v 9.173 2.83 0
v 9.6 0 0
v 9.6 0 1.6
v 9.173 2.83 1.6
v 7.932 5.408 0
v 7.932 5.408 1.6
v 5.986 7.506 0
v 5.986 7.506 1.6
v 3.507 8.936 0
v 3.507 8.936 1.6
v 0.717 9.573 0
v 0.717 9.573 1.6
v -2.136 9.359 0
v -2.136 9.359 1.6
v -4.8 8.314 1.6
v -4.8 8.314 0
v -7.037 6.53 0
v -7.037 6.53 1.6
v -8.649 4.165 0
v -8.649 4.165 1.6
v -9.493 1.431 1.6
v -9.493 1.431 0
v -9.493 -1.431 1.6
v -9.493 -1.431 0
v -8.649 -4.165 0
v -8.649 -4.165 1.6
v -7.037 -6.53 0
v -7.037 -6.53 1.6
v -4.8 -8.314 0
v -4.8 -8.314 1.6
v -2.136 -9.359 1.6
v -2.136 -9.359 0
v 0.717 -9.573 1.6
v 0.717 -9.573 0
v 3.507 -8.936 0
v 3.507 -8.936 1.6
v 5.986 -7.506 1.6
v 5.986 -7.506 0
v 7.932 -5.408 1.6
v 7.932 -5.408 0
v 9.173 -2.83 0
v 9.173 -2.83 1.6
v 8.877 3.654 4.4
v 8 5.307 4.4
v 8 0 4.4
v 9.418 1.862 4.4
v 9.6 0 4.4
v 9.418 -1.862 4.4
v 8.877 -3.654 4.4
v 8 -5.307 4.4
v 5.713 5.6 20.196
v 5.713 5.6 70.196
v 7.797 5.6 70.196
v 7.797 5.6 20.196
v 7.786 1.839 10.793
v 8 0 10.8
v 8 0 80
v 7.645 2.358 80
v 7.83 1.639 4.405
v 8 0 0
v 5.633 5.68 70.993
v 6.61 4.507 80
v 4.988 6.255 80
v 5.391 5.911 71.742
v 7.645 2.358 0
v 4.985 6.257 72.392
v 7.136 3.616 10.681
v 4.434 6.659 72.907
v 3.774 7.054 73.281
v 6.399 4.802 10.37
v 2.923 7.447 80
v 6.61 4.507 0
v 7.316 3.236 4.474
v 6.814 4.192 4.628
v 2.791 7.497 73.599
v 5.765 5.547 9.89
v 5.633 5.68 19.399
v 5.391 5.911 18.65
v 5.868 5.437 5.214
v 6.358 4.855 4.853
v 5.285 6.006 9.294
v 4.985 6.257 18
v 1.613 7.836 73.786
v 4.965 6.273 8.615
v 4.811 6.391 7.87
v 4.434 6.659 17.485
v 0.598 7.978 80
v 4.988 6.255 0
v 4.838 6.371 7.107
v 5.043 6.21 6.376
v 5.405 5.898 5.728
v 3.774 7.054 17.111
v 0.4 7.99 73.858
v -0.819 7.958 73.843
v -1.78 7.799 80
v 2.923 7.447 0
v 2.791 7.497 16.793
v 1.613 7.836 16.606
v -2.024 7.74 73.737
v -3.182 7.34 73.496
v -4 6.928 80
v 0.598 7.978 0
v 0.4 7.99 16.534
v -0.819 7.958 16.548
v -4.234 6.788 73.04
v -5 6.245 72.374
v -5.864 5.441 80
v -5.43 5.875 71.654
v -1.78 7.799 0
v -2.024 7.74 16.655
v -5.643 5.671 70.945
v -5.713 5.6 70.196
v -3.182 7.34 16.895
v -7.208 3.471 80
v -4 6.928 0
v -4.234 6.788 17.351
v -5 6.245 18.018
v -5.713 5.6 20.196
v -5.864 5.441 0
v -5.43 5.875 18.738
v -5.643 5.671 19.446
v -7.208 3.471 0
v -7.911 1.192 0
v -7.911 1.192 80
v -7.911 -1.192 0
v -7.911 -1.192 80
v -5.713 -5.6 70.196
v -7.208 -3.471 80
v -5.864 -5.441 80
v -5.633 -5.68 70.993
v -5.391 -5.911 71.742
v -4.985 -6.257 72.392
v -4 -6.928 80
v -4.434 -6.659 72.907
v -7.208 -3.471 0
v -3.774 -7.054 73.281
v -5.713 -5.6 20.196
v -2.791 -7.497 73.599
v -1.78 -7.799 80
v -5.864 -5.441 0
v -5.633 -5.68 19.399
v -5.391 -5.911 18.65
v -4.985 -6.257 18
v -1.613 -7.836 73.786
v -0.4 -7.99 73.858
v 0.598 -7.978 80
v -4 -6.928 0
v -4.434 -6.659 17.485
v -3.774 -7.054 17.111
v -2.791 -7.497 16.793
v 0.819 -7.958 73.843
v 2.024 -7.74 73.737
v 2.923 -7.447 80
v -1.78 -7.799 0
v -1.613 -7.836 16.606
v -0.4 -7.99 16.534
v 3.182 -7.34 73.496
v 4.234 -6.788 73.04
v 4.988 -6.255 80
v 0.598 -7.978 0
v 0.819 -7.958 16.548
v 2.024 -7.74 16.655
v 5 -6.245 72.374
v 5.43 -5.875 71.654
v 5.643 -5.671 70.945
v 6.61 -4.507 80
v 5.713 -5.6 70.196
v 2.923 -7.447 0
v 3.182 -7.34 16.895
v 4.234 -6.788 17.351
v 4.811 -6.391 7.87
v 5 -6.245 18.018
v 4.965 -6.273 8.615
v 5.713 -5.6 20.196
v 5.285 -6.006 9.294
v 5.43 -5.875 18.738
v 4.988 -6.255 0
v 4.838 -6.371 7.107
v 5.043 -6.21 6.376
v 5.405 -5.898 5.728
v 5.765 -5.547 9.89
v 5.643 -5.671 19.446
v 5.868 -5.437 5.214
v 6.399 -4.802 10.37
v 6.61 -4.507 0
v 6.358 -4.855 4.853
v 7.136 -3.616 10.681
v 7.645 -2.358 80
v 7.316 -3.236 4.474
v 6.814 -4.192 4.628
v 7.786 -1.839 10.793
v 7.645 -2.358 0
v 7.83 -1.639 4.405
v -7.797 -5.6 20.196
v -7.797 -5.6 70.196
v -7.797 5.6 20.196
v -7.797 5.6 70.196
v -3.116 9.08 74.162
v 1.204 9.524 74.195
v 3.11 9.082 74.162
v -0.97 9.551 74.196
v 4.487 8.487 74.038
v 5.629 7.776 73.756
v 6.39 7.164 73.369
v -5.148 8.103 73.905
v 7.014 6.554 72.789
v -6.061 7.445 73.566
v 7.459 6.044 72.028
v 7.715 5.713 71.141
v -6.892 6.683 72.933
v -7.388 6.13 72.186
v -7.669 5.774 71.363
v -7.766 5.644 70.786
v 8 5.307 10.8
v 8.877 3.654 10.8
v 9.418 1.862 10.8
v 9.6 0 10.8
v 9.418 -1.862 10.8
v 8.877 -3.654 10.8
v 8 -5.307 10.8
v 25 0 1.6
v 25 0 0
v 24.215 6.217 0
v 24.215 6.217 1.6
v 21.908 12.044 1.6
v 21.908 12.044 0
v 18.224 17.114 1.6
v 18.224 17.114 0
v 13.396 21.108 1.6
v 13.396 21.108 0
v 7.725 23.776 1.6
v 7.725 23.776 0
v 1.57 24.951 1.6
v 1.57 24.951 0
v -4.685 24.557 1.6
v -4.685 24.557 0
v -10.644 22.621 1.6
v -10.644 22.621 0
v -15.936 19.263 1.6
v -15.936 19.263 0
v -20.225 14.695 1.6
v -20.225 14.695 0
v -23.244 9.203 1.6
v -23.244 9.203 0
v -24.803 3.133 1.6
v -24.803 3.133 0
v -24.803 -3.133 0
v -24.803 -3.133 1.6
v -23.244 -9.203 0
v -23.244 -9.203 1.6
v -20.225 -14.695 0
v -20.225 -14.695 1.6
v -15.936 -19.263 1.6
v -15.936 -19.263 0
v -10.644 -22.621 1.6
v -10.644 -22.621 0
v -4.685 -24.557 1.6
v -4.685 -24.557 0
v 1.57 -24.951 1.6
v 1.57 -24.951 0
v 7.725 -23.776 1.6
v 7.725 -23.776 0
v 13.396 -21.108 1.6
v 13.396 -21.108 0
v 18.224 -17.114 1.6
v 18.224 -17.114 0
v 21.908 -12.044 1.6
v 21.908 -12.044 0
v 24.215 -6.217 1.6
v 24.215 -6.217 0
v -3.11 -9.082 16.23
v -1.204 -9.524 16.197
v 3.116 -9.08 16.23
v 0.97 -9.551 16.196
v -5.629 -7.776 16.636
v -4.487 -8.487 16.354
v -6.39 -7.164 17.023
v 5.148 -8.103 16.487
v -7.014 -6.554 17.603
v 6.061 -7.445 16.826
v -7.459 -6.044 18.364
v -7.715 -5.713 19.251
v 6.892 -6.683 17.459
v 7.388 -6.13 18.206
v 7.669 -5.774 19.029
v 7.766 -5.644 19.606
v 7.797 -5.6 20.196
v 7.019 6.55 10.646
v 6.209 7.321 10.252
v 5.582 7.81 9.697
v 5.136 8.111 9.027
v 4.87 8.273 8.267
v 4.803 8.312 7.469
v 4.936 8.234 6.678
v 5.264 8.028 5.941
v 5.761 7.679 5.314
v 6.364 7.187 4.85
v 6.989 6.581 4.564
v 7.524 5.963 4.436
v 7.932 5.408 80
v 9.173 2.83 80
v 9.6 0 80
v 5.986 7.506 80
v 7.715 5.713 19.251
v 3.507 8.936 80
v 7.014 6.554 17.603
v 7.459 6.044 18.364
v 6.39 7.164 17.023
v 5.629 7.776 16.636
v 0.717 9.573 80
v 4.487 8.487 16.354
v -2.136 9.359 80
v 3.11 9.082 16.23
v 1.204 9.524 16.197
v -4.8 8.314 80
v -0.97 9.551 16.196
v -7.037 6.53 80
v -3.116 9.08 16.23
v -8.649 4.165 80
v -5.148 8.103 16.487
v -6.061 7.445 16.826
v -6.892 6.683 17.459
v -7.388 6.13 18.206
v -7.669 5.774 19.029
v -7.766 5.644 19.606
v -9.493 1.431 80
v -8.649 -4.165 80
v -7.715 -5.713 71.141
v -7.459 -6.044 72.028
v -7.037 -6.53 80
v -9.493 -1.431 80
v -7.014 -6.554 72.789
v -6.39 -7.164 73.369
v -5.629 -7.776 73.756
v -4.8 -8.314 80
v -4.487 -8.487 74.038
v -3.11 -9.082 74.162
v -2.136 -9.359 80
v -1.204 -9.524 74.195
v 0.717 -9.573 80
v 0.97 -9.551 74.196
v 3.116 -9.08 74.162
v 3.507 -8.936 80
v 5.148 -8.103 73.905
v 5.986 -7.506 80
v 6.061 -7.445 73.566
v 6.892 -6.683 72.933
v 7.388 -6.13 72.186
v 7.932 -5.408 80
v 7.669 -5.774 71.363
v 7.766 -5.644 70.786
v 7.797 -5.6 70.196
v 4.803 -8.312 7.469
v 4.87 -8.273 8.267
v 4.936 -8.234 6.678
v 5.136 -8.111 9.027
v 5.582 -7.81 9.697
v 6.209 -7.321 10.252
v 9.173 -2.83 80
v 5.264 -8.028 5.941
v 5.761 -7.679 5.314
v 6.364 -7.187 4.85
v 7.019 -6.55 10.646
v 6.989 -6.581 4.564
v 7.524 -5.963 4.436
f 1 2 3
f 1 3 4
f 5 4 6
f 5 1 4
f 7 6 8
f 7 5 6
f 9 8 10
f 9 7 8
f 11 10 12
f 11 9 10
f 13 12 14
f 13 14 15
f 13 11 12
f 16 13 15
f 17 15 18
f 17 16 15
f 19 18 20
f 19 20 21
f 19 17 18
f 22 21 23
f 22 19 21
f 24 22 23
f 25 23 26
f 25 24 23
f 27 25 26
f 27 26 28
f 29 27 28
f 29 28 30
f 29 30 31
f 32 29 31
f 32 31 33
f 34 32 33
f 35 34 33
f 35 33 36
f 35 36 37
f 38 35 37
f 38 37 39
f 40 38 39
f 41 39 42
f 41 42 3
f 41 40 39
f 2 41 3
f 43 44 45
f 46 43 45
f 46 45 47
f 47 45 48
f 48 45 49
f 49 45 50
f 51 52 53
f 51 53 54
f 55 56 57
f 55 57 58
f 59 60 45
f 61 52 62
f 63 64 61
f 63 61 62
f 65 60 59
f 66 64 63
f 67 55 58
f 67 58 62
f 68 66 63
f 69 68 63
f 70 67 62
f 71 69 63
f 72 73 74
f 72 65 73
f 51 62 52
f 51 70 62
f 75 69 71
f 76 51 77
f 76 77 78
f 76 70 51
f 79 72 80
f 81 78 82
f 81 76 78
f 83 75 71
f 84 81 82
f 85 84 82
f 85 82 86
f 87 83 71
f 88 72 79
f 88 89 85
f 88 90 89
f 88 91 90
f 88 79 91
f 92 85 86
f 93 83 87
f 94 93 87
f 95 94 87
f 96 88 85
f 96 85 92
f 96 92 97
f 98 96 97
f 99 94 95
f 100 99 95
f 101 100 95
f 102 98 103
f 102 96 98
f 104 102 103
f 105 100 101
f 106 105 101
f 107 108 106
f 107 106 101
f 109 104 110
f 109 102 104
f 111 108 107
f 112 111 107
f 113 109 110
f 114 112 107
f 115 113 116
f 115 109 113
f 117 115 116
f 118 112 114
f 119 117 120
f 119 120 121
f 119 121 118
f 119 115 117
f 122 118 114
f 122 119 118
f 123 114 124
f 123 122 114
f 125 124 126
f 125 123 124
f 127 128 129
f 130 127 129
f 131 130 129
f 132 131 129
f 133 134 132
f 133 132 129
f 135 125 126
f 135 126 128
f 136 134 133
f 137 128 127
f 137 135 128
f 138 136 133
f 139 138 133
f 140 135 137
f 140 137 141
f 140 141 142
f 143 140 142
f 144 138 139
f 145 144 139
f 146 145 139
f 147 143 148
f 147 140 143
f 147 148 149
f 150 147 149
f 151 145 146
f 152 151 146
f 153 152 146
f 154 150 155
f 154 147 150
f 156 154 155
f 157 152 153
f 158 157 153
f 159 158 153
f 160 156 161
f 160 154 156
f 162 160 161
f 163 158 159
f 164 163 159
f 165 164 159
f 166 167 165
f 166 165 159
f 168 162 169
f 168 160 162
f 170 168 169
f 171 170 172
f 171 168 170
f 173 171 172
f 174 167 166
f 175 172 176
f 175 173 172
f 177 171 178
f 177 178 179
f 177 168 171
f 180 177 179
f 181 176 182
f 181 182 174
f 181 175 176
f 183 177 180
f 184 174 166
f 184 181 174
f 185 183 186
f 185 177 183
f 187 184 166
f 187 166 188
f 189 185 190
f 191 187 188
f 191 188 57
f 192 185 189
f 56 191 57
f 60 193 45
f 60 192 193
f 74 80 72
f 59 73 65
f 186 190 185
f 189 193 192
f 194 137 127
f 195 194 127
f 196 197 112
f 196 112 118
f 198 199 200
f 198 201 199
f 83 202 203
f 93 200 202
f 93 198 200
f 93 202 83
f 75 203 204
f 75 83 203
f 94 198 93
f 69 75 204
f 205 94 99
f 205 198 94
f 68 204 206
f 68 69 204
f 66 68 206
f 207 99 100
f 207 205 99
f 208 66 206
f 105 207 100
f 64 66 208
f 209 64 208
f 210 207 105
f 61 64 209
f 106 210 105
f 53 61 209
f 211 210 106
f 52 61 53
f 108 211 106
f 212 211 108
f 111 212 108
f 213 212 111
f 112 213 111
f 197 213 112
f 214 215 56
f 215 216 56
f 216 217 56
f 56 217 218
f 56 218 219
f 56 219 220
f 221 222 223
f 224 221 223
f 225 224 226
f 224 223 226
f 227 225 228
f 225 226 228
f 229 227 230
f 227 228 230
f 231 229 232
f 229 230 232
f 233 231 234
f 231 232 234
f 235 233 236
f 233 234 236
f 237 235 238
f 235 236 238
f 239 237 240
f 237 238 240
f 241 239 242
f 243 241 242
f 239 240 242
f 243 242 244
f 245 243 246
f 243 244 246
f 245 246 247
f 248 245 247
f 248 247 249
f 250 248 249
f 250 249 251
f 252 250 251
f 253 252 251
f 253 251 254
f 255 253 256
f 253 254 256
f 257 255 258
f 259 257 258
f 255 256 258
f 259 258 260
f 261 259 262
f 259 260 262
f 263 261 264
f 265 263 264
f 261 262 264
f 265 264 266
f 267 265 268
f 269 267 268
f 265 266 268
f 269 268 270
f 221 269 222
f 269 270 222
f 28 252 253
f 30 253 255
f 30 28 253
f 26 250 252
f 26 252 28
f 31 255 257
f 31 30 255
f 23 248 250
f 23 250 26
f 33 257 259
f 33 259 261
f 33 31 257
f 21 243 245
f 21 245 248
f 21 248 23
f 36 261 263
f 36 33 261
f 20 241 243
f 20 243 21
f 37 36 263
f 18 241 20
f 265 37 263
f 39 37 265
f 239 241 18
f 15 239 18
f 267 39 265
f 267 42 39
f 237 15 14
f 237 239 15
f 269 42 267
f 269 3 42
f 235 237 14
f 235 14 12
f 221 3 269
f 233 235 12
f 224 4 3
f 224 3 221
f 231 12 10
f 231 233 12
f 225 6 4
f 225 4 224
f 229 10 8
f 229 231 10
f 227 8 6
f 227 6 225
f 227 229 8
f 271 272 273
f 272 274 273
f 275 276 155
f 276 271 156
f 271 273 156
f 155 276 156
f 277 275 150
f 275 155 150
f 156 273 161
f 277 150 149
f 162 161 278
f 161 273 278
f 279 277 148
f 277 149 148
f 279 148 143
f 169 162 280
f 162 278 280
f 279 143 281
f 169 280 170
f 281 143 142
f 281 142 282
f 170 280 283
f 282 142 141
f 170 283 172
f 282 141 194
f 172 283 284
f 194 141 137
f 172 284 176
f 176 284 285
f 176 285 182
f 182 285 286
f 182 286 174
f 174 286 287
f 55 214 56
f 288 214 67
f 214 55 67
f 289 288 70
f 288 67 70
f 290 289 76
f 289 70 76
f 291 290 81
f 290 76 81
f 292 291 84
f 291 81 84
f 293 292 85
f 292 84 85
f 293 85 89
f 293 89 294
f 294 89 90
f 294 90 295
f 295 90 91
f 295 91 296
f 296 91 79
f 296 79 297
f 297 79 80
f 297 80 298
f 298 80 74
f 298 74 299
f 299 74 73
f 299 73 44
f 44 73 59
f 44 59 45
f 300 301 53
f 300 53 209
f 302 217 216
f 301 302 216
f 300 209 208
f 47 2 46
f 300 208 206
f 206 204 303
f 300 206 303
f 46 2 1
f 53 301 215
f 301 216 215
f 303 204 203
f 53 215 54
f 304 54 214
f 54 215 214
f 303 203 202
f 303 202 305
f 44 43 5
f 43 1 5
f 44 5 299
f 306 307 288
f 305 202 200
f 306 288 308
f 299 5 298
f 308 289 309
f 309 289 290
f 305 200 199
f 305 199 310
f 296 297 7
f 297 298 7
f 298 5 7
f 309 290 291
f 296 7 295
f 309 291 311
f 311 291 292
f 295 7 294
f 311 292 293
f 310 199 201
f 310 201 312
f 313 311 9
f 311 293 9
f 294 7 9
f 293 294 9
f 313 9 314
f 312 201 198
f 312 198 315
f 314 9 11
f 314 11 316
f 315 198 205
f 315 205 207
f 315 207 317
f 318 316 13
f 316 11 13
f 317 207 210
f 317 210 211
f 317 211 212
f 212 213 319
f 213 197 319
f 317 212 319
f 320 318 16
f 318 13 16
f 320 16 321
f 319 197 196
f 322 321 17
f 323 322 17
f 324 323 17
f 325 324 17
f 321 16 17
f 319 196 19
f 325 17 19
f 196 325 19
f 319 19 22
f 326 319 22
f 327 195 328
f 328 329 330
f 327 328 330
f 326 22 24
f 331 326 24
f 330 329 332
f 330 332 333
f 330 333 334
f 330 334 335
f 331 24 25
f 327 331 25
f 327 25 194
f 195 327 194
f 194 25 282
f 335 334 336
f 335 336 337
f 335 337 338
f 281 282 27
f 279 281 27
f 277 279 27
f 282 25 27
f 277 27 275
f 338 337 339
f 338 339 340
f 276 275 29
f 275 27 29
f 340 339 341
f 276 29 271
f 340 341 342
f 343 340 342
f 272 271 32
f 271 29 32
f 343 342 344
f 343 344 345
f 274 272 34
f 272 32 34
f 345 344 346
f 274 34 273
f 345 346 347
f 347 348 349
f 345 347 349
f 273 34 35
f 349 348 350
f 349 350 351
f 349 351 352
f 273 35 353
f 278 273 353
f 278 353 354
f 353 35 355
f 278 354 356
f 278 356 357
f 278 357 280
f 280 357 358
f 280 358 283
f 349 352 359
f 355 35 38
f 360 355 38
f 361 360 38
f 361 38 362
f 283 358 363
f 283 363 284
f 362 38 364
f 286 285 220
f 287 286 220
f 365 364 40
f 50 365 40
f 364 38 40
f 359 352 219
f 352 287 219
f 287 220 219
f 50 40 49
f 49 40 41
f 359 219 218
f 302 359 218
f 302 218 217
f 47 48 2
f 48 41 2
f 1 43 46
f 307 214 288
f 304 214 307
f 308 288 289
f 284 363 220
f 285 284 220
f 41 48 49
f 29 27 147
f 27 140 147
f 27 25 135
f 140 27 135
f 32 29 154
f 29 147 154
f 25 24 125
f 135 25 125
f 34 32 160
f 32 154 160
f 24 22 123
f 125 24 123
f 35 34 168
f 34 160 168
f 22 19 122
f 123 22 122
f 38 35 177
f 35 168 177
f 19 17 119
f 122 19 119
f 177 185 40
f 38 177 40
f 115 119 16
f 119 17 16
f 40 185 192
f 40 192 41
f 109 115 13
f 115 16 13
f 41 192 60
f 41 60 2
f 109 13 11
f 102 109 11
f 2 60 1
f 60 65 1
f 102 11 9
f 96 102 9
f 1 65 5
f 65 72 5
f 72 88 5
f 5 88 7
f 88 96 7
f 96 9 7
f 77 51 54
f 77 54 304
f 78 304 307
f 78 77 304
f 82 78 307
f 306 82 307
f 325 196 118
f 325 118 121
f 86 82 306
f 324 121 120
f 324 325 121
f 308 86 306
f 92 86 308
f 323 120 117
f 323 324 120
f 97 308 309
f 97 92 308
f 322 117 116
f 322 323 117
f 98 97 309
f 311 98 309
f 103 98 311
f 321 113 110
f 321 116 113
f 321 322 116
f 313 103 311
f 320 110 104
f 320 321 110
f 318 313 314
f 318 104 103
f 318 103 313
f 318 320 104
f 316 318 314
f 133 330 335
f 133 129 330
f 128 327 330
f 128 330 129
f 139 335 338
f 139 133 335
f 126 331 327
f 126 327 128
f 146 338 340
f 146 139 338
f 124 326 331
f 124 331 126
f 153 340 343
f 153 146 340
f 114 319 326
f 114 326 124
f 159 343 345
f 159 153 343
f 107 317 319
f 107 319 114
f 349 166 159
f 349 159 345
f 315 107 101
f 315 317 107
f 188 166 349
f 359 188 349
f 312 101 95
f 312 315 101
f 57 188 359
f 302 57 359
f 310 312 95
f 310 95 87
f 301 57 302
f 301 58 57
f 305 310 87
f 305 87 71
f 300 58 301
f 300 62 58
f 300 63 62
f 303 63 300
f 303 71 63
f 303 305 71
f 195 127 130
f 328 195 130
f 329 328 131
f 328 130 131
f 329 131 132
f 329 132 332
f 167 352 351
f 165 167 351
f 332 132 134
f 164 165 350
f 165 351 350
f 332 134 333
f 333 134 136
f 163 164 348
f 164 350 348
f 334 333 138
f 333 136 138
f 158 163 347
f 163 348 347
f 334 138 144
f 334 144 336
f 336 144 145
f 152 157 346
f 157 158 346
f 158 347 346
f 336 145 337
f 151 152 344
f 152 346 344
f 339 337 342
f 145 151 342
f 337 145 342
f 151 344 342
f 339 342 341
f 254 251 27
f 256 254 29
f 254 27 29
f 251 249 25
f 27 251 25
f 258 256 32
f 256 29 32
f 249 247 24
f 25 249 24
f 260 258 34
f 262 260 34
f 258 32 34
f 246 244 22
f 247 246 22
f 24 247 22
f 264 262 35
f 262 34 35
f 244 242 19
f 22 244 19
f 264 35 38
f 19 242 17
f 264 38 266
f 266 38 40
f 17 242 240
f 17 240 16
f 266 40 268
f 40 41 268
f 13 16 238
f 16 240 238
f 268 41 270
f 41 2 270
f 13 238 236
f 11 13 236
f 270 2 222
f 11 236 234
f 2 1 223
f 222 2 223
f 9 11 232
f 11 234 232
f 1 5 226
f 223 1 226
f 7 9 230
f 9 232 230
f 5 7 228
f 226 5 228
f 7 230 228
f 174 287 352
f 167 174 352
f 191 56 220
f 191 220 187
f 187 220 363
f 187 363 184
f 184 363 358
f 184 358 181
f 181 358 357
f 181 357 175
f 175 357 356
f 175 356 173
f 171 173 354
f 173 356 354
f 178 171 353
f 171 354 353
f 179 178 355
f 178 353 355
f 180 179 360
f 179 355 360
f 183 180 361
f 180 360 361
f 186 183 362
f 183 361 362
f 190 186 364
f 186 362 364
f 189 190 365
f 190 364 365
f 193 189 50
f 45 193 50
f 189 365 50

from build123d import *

# Parameters (mm, degrees)
F0_R     = 25
F0_R_2   = 9.6
F1_DEPTH = 1.6
F0_R_3   = 8
F2_DEPTH = 80
F4_DEPTH = 25
F6_DEPTH = 25


with BuildPart() as f1:
    # F0 (on Top) → F1 (new body)
    with BuildSketch(Plane.XY):
        Circle(F0_R)
        Circle(F0_R_2, mode=Mode.SUBTRACT)
    extrude(amount=F1_DEPTH)


with BuildPart() as f2:
    # F0 (on Top) → F2 (new body)
    with BuildSketch(Plane.XY):
        Circle(F0_R_2)
        Circle(F0_R_3, mode=Mode.SUBTRACT)
    extrude(amount=F2_DEPTH)

    # F3 (on Front) → F4 (cut, symmetric)
    with BuildSketch(Plane.XZ):
        with BuildLine():
            Line((8, 4.4), (8, 10.8))
            ThreePointArc((8, 10.8), (4.8, 7.6), (8, 4.4))
        make_face()
        with BuildLine():
            ThreePointArc((8, 4.4), (10.2627416998, 5.3372583002), (11.2, 7.6))
            ThreePointArc((11.2, 7.6), (10.2627416998, 9.8627416998), (8, 10.8))
            Line((8, 10.8), (8, 4.4))
        make_face()
        with BuildLine():
            ThreePointArc((8, 10.8), (10.2627416998, 9.8627416998), (11.2, 7.6))
            ThreePointArc((11.2, 7.6), (10.2627416998, 5.3372583002), (8, 4.4))
            Line((8, 4.4), (18.203275606, 4.4))
            Line((18.203275606, 4.4), (18.203275606, 10.8))
            Line((18.203275606, 10.8), (8, 10.8))
        make_face()
    extrude(amount=F4_DEPTH, both=True, mode=Mode.SUBTRACT)

    # F5 (on Right) → F6 (cut, symmetric)
    with BuildSketch(Plane.YZ):
        with BuildLine():
            ThreePointArc((13.6, 70.1958991309), (9.6, 74.1958991309), (5.6, 70.1958991309))
            Line((5.6, 70.1958991309), (13.6, 70.1958991309))
        make_face()
        with BuildLine():
            ThreePointArc((13.6, 70.1958991309), (9.6, 66.1958991309), (5.6, 70.1958991309))
            Line((5.6, 70.1958991309), (5.6, 20.1958991309))
            ThreePointArc((5.6, 20.1958991309), (9.6, 24.1958991309), (13.6, 20.1958991309))
            Line((13.6, 20.1958991309), (13.6, 70.1958991309))
        make_face()
        with BuildLine():
            Line((13.6, 20.1958991309), (5.6, 20.1958991309))
            ThreePointArc((5.6, 20.1958991309), (9.6, 16.1958991309), (13.6, 20.1958991309))
        make_face()
        with BuildLine():
            Line((13.6, 70.1958991309), (5.6, 70.1958991309))
            ThreePointArc((5.6, 70.1958991309), (9.6, 66.1958991309), (13.6, 70.1958991309))
        make_face()
        with BuildLine():
            ThreePointArc((13.6, 20.1958991309), (9.6, 24.1958991309), (5.6, 20.1958991309))
            Line((5.6, 20.1958991309), (13.6, 20.1958991309))
        make_face()
        with BuildLine():
            Line((-13.6, 70.1958991309), (-5.6, 70.1958991309))
            ThreePointArc((-5.6, 70.1958991309), (-9.6, 74.1958991309), (-13.6, 70.1958991309))
        make_face()
        with BuildLine():
            ThreePointArc((-13.6, 70.1958991309), (-9.6, 66.1958991309), (-5.6, 70.1958991309))
            Line((-5.6, 70.1958991309), (-13.6, 70.1958991309))
        make_face()
        with BuildLine():
            Line((-5.6, 20.1958991309), (-5.6, 70.1958991309))
            ThreePointArc((-5.6, 70.1958991309), (-9.6, 66.1958991309), (-13.6, 70.1958991309))
            Line((-13.6, 70.1958991309), (-13.6, 20.1958991309))
            ThreePointArc((-13.6, 20.1958991309), (-9.6, 24.1958991309), (-5.6, 20.1958991309))
        make_face()
        with BuildLine():
            Line((-13.6, 20.1958991309), (-5.6, 20.1958991309))
            ThreePointArc((-5.6, 20.1958991309), (-9.6, 24.1958991309), (-13.6, 20.1958991309))
        make_face()
        with BuildLine():
            ThreePointArc((-13.6, 20.1958991309), (-9.6, 16.1958991309), (-5.6, 20.1958991309))
            Line((-5.6, 20.1958991309), (-13.6, 20.1958991309))
        make_face()
    extrude(amount=F6_DEPTH, both=True, mode=Mode.SUBTRACT)


solid = Compound([f1.part, f2.part])
